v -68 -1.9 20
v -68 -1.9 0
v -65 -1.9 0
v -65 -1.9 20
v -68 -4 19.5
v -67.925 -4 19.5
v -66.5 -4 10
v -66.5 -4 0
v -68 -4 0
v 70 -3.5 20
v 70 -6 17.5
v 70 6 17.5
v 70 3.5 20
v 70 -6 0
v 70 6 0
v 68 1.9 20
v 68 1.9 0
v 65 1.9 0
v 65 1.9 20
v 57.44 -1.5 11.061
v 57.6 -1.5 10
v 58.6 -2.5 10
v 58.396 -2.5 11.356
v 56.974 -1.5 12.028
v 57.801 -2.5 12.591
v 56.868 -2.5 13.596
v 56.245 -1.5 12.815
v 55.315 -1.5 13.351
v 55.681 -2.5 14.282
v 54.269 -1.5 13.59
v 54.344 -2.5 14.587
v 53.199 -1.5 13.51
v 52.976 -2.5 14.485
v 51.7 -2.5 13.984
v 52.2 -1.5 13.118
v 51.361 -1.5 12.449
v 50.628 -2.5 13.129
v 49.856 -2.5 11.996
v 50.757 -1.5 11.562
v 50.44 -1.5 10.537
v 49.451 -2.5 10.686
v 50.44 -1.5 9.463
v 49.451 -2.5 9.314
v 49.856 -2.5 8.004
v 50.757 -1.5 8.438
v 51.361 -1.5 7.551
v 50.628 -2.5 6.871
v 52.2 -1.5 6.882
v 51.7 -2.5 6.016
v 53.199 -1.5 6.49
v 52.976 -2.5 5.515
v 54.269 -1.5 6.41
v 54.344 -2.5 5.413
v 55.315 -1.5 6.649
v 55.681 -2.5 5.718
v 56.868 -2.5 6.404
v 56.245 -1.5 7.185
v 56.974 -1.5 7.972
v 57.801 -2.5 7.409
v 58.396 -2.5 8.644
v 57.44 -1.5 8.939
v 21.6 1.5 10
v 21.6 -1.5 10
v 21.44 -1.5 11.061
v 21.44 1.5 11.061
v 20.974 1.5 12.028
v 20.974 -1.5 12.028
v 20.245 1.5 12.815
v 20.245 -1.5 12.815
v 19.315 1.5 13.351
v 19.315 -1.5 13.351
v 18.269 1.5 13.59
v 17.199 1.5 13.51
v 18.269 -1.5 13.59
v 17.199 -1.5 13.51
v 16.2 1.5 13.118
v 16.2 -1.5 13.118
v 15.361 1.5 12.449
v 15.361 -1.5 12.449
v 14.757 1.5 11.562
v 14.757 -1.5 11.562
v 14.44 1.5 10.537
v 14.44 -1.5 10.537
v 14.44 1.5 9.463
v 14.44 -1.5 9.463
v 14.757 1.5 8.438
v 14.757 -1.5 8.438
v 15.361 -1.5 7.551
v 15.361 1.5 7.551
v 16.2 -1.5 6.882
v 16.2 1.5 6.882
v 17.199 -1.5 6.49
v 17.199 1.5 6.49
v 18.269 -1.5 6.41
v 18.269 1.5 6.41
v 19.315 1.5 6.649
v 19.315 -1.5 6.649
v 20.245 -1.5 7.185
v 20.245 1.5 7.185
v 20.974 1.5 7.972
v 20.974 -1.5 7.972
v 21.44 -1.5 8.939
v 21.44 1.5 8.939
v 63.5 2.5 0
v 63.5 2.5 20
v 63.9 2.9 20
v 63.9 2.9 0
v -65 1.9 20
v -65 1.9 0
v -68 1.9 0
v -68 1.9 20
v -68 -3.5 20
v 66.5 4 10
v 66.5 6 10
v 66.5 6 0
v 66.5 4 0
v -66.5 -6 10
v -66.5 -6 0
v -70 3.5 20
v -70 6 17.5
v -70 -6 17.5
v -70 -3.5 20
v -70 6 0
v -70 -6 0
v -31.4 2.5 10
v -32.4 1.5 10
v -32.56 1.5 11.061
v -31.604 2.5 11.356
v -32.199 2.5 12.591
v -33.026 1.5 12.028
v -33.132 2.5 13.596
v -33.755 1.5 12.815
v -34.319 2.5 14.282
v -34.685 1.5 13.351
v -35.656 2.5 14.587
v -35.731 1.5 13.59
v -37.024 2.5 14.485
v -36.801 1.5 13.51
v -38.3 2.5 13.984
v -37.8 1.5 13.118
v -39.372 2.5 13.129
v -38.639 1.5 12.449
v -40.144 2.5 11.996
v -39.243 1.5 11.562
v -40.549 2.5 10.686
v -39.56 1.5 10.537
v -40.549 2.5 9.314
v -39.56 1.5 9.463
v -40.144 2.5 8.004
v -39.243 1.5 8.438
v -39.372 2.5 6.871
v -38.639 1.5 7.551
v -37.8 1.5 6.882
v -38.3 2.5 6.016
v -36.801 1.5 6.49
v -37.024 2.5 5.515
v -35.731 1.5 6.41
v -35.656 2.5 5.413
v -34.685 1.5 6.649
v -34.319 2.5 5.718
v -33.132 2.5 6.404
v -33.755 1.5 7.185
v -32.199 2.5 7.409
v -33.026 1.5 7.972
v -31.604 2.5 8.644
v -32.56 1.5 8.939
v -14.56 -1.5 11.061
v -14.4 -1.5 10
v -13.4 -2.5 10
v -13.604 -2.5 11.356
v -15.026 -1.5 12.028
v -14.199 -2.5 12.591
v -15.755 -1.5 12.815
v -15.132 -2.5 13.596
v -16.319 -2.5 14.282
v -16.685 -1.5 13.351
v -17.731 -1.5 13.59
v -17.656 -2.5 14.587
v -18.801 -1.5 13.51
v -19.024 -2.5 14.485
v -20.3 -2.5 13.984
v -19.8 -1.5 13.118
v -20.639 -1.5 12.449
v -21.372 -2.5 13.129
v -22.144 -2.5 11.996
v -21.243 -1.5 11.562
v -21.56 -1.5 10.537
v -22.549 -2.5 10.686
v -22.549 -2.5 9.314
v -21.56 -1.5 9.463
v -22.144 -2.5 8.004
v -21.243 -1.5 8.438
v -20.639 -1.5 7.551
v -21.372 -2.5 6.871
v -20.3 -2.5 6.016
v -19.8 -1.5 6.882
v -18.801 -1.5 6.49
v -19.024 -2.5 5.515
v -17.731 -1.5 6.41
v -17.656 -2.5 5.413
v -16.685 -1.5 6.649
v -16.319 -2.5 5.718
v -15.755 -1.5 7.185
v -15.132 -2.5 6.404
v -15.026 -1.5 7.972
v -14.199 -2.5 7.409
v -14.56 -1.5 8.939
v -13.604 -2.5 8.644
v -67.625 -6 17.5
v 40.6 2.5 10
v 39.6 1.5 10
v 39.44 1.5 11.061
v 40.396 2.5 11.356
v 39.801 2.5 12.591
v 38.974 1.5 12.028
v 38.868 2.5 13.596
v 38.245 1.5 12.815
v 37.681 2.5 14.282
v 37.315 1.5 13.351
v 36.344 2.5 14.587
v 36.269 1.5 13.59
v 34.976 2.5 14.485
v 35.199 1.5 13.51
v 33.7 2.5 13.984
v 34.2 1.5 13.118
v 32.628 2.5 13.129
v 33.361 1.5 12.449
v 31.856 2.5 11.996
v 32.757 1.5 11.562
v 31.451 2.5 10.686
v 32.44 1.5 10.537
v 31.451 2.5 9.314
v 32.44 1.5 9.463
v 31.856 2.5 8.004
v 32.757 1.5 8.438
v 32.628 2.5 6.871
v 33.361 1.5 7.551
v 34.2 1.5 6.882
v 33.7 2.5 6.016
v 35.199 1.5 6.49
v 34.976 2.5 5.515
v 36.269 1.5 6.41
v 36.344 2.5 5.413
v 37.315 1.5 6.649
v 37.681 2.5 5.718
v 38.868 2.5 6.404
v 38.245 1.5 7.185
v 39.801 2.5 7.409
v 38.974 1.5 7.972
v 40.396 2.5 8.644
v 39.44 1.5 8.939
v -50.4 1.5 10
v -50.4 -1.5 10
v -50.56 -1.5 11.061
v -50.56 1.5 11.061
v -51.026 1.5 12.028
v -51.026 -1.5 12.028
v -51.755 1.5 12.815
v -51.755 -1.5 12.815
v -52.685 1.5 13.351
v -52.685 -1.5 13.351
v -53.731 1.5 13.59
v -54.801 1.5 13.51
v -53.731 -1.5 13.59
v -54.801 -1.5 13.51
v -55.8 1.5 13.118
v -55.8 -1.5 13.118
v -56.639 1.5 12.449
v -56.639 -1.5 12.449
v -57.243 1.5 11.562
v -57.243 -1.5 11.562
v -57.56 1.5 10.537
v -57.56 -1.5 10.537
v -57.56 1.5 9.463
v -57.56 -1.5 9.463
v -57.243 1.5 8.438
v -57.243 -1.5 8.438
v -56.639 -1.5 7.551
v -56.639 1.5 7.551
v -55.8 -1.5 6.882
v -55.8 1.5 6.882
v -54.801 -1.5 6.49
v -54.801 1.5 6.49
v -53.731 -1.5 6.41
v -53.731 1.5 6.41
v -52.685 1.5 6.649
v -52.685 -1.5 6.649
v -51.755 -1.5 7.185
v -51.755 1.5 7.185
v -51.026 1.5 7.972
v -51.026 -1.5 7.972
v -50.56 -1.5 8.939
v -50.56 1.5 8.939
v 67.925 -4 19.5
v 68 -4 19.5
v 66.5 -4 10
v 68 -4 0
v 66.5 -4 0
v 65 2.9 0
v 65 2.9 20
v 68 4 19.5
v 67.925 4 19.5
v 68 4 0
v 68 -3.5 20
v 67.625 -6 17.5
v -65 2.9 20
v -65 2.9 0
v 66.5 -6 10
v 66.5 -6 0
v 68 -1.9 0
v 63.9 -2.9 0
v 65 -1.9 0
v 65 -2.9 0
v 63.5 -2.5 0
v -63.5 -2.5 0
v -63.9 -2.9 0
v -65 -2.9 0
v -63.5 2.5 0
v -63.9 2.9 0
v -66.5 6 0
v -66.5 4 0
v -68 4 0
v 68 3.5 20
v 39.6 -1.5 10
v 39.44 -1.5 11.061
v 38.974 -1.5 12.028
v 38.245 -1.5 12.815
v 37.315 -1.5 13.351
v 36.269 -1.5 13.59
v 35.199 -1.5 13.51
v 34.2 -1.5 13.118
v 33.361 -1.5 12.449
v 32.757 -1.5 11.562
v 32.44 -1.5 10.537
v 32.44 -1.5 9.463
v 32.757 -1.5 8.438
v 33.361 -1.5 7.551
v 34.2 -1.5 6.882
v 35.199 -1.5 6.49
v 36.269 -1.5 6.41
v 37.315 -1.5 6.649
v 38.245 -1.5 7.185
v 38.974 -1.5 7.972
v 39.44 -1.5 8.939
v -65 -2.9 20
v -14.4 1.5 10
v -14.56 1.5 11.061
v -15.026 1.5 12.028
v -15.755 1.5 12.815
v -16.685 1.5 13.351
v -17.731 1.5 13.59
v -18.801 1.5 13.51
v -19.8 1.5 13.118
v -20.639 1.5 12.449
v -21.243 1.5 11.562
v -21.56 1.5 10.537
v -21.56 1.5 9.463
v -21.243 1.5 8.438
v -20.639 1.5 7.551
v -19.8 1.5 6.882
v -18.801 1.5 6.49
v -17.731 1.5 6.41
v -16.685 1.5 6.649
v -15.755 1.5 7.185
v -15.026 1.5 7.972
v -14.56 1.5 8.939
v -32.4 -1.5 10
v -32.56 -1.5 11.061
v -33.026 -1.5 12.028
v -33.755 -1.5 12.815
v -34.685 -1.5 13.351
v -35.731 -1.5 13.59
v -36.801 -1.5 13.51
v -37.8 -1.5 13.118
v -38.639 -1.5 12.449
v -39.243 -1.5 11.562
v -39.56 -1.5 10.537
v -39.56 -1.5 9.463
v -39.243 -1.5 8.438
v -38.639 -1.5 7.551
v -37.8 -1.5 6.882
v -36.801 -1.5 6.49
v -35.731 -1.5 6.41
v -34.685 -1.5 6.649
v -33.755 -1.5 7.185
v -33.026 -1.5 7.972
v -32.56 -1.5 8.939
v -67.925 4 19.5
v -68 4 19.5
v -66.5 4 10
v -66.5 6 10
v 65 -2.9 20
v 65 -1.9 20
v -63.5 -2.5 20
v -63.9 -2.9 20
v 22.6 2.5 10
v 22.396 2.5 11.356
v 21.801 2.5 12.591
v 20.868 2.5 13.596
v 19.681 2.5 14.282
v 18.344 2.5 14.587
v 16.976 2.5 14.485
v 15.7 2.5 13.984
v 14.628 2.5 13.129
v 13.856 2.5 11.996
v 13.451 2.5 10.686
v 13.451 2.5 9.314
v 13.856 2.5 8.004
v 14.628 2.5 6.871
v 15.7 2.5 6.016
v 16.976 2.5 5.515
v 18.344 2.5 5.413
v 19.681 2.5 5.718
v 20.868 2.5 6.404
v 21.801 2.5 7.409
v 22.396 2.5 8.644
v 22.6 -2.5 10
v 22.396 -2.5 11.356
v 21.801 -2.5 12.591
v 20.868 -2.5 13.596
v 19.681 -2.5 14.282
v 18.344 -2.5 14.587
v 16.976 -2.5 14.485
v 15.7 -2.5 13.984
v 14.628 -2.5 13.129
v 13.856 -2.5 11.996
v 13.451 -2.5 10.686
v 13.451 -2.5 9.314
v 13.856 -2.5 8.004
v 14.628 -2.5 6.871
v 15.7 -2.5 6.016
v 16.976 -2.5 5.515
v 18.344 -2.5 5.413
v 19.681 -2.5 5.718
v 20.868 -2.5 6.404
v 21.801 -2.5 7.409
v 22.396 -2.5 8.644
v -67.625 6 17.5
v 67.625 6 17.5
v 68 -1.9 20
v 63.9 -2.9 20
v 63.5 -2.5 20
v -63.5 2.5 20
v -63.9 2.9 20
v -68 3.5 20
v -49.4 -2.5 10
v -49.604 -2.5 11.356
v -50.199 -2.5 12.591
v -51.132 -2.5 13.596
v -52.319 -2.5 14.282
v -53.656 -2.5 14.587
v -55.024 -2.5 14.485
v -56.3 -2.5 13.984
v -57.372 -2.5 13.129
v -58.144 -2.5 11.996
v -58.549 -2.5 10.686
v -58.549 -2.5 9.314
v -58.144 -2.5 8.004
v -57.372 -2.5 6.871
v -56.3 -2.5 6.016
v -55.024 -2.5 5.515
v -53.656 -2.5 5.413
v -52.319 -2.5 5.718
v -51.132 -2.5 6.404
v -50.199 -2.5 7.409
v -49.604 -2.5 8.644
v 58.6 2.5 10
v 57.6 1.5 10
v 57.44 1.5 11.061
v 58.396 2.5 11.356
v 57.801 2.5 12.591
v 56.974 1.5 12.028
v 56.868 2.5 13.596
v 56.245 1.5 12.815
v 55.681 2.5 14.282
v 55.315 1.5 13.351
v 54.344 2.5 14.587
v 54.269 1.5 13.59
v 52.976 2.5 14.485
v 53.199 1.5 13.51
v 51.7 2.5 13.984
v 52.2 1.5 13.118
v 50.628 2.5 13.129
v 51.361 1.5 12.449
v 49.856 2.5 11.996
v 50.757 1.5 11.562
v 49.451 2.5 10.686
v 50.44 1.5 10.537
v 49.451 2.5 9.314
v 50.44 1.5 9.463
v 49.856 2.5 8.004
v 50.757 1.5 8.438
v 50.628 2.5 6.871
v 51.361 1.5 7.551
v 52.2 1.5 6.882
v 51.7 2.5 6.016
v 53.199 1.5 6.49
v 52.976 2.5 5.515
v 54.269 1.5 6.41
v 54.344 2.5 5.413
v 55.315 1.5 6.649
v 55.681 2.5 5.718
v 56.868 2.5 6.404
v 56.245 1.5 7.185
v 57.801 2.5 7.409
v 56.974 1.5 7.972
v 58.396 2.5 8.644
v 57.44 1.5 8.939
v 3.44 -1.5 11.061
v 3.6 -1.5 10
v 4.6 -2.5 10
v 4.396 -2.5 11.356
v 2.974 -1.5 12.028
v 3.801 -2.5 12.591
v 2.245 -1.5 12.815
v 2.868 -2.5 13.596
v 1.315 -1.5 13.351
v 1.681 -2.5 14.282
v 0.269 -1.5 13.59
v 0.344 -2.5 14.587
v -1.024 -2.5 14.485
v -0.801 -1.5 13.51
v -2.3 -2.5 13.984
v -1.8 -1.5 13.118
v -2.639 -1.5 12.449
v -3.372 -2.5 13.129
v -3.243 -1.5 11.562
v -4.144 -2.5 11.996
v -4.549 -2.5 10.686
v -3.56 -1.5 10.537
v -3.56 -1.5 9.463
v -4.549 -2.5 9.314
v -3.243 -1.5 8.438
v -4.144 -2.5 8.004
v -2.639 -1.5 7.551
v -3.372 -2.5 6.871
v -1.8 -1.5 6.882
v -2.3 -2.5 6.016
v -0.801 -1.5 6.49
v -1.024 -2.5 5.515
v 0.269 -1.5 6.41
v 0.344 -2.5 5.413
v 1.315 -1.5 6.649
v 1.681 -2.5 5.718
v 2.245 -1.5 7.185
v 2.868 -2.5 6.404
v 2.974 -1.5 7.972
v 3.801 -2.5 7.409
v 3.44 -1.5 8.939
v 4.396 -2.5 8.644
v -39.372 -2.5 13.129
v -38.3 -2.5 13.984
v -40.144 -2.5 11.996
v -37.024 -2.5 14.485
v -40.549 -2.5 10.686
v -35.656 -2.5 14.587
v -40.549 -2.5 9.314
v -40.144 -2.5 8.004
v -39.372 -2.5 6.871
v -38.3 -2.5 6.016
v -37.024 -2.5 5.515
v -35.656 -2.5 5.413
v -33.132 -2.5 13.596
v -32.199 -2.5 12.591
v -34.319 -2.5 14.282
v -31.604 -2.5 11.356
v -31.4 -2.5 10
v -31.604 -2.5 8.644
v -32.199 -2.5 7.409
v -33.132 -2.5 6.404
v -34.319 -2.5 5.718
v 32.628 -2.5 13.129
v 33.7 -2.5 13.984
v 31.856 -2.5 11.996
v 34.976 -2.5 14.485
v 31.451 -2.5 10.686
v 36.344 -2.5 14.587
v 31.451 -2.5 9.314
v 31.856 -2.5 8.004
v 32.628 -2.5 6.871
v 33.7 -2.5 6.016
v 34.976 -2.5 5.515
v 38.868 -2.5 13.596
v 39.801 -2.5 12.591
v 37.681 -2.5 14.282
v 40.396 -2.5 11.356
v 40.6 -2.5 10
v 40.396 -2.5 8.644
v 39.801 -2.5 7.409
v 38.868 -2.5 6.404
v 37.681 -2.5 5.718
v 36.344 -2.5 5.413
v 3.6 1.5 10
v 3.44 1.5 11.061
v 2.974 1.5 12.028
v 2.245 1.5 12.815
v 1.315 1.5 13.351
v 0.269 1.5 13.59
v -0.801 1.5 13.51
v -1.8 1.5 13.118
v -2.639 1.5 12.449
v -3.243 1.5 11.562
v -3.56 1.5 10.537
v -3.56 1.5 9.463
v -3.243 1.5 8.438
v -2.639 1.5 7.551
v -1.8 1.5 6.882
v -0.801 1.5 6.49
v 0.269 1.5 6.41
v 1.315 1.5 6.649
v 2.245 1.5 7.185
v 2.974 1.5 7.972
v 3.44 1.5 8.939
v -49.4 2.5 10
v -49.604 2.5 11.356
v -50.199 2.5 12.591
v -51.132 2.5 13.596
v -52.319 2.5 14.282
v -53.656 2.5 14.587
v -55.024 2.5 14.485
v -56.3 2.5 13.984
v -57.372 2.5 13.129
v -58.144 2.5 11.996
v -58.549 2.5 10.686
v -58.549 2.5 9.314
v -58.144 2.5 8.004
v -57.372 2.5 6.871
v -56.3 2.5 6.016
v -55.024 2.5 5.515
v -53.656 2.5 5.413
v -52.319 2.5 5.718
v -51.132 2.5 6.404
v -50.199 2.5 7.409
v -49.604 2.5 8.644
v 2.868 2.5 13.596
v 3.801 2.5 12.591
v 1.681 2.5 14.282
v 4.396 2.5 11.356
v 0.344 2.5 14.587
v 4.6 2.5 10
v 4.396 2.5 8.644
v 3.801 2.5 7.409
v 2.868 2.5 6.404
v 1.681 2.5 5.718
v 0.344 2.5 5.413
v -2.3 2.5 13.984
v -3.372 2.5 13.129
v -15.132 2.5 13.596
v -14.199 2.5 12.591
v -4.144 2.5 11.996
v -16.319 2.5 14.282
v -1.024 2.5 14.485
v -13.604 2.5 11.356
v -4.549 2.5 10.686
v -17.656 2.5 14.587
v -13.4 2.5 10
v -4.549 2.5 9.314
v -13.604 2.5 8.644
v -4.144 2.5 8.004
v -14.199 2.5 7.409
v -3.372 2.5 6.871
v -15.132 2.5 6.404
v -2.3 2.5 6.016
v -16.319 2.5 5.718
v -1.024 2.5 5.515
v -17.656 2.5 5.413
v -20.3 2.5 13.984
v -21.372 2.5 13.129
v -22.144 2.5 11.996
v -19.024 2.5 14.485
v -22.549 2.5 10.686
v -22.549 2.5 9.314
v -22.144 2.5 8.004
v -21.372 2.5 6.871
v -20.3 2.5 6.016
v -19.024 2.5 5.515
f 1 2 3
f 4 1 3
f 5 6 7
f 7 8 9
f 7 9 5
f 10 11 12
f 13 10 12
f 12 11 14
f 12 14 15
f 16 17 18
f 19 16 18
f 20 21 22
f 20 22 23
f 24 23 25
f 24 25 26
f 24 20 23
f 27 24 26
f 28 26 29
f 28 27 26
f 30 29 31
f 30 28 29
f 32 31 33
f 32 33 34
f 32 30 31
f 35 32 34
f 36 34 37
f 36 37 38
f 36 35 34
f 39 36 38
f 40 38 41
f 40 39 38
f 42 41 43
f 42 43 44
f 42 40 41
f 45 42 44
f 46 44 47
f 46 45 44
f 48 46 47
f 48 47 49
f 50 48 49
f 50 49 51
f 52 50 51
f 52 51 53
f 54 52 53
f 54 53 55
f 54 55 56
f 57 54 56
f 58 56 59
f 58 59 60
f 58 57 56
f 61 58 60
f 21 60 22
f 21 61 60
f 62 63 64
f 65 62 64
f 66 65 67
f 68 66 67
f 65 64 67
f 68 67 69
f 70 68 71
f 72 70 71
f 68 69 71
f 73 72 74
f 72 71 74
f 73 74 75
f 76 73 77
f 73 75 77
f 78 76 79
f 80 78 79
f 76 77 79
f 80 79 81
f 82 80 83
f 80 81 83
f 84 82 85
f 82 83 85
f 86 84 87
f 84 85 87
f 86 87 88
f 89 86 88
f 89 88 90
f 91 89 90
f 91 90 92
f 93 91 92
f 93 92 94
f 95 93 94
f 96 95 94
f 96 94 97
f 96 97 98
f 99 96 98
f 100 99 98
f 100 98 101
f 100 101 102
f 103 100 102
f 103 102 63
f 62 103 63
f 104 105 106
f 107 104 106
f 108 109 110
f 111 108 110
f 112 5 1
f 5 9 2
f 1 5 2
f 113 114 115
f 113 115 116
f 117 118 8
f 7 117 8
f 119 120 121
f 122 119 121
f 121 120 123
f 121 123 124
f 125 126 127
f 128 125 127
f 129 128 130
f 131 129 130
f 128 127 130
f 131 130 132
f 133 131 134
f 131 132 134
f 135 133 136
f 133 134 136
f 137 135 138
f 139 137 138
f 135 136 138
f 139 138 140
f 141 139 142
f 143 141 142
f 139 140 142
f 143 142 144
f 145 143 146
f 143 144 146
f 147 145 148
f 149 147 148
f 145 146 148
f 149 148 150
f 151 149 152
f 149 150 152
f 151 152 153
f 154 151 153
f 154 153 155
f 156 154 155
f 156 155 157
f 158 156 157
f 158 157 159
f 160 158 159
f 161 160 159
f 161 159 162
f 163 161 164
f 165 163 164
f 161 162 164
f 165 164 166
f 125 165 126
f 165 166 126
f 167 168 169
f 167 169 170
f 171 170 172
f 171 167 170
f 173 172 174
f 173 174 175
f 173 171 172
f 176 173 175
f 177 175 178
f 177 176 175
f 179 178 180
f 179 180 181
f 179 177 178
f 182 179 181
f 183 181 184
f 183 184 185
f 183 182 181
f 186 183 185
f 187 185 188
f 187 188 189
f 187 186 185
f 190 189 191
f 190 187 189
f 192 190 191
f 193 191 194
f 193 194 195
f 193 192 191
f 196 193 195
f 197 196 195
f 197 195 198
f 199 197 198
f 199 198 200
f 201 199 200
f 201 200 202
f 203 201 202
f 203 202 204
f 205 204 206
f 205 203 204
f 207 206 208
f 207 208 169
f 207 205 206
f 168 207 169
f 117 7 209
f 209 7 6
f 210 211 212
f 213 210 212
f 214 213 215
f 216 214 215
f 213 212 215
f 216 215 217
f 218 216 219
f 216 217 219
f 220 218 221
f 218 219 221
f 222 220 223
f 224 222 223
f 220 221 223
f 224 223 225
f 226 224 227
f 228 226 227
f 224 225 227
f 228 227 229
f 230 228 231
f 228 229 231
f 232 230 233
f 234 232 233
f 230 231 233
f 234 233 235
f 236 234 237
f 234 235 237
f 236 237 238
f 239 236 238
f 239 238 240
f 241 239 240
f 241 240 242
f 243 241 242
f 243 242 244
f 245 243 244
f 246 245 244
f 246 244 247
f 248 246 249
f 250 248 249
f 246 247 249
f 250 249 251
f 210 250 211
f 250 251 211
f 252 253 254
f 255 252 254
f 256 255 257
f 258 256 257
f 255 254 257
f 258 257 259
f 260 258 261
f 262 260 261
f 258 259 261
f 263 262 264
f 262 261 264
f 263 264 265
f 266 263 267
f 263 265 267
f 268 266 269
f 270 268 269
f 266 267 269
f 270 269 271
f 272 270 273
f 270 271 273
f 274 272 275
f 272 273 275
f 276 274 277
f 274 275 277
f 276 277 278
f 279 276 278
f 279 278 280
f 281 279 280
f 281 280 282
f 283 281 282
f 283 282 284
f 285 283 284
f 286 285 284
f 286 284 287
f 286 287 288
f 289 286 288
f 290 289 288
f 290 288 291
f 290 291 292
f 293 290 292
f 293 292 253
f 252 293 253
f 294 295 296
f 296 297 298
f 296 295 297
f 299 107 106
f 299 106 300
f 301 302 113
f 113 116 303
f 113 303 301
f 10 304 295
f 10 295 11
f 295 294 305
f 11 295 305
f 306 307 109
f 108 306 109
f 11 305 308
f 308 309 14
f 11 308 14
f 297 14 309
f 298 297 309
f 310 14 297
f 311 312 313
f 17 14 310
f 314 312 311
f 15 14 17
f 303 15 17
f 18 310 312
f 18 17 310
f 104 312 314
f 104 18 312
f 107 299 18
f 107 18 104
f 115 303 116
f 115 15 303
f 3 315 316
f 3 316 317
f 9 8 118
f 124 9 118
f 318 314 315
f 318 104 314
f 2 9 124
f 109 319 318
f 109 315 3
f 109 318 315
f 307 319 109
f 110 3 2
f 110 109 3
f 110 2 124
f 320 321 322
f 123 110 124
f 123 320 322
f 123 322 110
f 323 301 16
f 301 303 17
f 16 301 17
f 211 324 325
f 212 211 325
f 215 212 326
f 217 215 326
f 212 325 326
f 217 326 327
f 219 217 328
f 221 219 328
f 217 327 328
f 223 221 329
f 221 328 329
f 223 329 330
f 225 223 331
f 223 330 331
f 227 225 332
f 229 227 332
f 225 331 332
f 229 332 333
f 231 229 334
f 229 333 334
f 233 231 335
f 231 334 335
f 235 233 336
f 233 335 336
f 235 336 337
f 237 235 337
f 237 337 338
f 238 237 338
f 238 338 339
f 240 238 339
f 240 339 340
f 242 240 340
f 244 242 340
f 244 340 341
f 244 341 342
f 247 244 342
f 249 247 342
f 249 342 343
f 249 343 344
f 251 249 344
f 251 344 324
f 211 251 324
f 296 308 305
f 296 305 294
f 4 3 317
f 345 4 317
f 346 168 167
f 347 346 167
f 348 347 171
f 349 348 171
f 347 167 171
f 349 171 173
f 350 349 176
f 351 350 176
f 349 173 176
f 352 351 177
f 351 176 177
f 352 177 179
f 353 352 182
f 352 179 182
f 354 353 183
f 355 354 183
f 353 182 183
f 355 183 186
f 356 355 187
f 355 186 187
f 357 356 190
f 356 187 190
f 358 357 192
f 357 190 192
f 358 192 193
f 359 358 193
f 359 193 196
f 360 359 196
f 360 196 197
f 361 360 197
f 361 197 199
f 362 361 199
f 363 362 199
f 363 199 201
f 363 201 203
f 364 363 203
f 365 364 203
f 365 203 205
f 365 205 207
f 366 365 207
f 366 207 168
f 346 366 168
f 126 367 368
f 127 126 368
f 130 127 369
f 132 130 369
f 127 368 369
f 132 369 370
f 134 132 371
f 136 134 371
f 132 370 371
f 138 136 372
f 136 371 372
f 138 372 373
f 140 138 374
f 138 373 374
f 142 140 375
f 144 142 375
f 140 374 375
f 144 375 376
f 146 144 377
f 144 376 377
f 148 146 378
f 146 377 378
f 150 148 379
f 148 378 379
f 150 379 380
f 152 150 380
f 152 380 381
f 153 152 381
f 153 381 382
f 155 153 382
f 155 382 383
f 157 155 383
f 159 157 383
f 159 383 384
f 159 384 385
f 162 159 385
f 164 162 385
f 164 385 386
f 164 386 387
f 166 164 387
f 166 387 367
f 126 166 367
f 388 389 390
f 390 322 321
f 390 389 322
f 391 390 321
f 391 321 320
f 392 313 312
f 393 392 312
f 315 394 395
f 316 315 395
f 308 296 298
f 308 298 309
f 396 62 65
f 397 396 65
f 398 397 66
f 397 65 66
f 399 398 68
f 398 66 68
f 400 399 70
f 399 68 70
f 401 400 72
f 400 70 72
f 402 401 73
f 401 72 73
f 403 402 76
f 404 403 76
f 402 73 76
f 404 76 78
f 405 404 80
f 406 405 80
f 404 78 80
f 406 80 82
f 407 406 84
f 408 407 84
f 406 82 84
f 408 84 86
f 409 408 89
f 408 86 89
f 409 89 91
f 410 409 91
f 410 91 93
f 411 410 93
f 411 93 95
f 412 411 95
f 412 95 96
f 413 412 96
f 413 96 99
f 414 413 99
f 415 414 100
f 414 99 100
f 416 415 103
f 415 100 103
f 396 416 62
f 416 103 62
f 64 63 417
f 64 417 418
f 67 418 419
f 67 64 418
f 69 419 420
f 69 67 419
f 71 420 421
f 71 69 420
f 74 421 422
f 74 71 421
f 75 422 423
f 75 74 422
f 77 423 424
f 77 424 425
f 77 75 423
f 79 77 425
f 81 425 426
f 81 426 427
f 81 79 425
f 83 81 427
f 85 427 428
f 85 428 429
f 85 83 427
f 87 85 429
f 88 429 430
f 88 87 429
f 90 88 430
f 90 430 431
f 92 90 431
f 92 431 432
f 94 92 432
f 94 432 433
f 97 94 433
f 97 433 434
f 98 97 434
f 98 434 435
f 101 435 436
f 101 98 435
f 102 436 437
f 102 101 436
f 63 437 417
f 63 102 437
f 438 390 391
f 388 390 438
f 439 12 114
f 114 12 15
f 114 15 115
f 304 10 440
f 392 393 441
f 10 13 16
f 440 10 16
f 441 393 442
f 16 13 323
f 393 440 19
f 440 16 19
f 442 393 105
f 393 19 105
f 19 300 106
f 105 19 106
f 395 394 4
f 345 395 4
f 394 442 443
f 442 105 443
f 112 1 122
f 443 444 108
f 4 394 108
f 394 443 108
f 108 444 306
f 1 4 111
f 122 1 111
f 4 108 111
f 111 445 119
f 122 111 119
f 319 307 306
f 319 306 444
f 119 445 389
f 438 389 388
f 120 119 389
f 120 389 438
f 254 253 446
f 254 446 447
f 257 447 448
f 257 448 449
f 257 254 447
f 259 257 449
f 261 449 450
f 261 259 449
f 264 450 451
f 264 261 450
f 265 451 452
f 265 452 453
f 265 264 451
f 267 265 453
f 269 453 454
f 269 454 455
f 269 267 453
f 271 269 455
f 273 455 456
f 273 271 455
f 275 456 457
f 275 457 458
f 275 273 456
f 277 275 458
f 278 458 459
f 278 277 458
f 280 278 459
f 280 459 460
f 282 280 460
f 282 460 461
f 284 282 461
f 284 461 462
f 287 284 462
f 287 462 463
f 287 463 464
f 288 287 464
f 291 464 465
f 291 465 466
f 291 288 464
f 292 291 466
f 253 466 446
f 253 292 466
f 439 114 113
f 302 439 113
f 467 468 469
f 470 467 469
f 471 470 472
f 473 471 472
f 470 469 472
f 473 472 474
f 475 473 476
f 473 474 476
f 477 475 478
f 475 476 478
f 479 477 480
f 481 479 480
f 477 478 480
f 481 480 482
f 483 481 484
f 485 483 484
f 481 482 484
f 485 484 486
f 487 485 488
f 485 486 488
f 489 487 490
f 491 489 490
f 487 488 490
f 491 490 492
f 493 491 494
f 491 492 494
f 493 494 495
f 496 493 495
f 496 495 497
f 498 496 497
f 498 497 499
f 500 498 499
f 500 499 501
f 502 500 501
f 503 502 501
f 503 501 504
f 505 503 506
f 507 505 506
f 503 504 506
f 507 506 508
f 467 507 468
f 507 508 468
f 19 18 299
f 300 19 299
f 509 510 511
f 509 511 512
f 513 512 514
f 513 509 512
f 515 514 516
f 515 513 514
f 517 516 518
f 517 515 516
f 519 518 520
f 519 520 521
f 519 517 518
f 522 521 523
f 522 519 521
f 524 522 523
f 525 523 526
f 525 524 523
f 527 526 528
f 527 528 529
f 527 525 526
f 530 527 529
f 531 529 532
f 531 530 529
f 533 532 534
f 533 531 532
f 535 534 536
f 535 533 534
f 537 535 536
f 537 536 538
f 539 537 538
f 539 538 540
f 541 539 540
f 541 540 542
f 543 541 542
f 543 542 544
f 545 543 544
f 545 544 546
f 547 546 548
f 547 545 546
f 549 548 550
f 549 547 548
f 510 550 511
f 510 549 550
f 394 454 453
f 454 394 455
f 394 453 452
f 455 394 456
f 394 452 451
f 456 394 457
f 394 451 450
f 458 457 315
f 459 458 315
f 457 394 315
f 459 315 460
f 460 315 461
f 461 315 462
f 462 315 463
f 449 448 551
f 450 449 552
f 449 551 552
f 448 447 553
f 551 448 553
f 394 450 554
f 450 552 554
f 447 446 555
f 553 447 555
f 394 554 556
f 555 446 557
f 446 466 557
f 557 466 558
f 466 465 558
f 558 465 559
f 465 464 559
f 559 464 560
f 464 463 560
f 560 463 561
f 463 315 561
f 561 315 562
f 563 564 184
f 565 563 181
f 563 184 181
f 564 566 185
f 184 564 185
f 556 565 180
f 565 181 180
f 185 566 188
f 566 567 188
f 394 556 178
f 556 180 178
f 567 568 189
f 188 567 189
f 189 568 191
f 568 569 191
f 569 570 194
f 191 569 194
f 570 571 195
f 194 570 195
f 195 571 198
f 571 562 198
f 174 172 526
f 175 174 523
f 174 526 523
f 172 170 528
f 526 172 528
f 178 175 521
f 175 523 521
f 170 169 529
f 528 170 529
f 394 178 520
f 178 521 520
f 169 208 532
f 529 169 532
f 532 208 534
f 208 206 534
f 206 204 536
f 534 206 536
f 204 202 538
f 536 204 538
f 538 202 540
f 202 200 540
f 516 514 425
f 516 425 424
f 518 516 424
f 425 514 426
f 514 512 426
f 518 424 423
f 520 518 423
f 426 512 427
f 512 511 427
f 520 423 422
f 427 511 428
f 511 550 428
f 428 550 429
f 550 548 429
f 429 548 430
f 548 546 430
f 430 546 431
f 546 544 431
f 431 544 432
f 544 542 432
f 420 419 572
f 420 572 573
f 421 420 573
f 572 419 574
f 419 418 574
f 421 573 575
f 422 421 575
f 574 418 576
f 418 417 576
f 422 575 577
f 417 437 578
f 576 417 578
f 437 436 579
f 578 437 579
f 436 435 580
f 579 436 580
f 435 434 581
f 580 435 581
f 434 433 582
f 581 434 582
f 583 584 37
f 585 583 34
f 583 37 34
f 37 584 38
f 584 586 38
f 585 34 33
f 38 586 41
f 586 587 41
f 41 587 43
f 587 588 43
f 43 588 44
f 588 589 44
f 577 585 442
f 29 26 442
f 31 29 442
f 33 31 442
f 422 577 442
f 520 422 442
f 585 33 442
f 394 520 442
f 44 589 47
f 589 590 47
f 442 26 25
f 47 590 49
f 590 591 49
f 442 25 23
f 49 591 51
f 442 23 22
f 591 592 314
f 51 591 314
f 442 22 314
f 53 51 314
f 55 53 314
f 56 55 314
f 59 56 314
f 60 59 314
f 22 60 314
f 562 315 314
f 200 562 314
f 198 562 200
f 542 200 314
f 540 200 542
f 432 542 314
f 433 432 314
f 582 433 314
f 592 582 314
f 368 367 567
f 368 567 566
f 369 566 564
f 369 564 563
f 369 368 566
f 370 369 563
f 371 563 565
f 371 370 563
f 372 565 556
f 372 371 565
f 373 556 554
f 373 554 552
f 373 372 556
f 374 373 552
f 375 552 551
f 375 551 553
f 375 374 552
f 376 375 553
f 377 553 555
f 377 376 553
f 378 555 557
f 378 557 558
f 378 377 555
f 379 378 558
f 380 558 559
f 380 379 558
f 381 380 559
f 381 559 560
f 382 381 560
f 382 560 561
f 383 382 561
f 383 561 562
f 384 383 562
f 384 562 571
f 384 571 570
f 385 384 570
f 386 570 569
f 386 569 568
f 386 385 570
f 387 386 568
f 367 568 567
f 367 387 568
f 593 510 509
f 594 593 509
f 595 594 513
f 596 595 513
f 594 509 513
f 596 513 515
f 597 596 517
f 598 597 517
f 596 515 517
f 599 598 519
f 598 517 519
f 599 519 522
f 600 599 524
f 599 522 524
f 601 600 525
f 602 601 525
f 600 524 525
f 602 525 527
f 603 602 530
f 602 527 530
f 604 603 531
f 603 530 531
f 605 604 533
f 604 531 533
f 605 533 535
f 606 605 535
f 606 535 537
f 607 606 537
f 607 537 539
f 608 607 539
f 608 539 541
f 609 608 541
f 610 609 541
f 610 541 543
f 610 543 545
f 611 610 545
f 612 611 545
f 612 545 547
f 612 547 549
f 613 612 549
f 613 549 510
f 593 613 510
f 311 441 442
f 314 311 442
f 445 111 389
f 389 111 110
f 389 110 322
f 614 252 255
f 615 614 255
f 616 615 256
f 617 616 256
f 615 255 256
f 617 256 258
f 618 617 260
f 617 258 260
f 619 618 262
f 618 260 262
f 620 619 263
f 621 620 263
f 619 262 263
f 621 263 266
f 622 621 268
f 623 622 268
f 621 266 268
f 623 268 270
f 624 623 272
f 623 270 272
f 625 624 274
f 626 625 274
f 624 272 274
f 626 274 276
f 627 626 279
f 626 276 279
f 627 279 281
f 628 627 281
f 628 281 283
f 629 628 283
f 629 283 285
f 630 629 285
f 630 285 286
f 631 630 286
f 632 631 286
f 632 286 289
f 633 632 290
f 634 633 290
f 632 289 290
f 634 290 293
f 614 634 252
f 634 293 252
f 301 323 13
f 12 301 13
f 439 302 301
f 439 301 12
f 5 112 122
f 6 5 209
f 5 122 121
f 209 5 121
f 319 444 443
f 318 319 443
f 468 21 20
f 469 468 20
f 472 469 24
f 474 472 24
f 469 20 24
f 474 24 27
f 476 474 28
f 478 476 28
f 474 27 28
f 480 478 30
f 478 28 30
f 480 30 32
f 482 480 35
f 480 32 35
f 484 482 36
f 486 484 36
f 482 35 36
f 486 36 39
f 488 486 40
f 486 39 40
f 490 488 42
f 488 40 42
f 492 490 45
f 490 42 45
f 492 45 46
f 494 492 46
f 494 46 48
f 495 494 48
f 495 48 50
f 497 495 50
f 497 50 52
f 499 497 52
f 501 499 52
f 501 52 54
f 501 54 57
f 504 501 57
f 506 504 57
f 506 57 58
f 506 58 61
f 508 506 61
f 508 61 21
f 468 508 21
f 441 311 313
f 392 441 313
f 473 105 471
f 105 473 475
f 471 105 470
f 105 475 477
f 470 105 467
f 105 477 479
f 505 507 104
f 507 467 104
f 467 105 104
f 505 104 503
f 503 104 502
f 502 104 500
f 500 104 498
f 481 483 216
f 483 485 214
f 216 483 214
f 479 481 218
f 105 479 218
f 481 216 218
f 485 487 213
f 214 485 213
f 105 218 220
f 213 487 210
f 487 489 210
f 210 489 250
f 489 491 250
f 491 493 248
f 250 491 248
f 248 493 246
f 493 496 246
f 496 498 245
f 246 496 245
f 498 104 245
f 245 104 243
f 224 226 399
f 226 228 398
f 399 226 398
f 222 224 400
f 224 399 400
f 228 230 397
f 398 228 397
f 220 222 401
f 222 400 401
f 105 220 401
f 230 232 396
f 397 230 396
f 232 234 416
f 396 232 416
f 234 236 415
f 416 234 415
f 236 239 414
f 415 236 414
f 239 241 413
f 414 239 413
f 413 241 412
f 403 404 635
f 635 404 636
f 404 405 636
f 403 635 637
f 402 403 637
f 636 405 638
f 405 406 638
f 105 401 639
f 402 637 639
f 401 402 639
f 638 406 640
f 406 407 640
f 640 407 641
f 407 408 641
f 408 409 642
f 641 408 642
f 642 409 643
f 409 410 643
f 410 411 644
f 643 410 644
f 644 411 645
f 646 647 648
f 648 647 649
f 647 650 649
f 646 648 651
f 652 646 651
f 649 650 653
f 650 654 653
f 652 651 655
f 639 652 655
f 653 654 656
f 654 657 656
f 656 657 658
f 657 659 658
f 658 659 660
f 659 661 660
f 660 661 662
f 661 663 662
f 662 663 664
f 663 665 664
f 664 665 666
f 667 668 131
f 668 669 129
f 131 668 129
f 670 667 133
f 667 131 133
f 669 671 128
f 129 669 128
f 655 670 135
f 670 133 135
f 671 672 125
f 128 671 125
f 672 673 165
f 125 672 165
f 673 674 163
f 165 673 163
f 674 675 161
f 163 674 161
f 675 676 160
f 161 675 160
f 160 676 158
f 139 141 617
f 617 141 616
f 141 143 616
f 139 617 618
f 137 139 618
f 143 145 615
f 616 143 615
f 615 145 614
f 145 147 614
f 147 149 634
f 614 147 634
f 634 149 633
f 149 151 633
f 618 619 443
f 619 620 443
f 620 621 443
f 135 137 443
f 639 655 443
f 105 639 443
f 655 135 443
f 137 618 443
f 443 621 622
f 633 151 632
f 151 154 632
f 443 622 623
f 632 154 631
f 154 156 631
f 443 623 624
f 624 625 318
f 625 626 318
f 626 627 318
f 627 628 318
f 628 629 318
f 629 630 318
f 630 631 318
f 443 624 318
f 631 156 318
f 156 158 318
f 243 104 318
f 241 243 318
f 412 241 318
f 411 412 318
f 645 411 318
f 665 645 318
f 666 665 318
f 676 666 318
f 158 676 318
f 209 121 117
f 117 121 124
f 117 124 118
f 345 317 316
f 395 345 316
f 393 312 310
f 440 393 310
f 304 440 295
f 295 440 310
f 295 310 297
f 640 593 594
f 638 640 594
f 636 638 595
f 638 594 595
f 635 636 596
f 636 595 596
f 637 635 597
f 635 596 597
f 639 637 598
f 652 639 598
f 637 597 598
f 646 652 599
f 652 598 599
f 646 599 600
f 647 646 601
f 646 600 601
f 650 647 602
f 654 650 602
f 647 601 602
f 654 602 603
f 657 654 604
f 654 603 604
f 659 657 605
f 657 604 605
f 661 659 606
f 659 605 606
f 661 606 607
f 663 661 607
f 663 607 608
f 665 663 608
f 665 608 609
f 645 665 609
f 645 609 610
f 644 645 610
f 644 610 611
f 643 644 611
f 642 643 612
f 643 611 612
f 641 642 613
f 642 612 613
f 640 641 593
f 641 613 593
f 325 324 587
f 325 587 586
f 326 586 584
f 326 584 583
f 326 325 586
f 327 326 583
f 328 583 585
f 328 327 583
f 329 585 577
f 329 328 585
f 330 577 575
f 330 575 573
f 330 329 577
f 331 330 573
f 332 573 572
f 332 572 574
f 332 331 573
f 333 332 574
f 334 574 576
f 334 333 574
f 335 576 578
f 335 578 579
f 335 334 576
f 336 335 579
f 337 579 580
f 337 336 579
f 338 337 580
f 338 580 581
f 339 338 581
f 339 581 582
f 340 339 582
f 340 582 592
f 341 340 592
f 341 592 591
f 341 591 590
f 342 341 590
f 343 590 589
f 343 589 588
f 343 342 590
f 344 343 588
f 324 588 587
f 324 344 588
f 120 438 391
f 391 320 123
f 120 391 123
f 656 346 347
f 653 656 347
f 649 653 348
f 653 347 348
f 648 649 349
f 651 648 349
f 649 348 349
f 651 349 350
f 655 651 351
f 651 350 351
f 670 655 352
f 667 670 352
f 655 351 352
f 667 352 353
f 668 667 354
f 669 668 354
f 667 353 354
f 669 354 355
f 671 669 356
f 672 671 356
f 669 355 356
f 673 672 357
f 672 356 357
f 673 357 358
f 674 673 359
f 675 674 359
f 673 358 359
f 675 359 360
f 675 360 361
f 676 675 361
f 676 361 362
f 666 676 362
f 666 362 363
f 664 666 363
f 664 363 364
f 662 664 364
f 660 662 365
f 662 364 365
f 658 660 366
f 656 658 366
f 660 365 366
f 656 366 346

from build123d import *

# Parameters (mm, degrees)
F1_DEPTH     = 20
F2_T4_DEPTH  = 20
F2_T9_DEPTH  = 20
F2_T14_DEPTH = 20
F2_T19_DEPTH = 20
F3_SIZE2     = 1.5
F3_SIZE      = 10
F3_2_SIZE2   = 1.5
F3_2_SIZE    = 10
F3_3_SIZE2   = 1.5
F3_3_SIZE    = 10
F3_4_SIZE2   = 1.5
F3_4_SIZE    = 10
F4_T1_DEPTH  = 14.8584149398
F4_T3_DEPTH  = 14.8584149398
F5_R         = 3.6
F6_DEPTH     = 25
F7_SIZE      = 1


# Not quite as in the source:
# - a fillet or chamfer that OpenCascade refuses, or shapes differently, is made with other operations: its cross-section is extruded or revolved along the edge and cut away or added


with BuildPart() as f1:
    # F0 (on Top) → F1 (new body)
    with BuildSketch(Plane.XY):
        Polygon((-70, 6), (-70, 0), (-70, -6), (-66.5, -6), (-66.5, -4), (-68, -4), (-68, -1.9), (-65, -1.9), (-65, -2.9), (-64, -2.9), (-64, -2.5), (0, -2.5), (64, -2.5), (64, -2.9), (65, -2.9), (65, -1.9), (68, -1.9), (68, -4), (66.5, -4), (66.5, -6), (70, -6), (70, 0), (70, 6), (66.5, 6), (66.5, 4), (68, 4), (68, 1.9), (65, 1.9), (65, 2.9), (64, 2.9), (64, 2.5), (0, 2.5), (-64, 2.5), (-64, 2.9), (-65, 2.9), (-65, 1.9), (-68, 1.9), (-68, 4), (-66.5, 4), (-66.5, 6), align=None)
    extrude(amount=F1_DEPTH)

    # F2: chamfer of 0.5 on 4 edges, made by hand


with BuildPart() as f2_tool2:
    # F2_s3 → F2_t4 (new body)
    with BuildSketch(Plane.XY):
        Polygon((-64, 3), (-63.5, 2.5), (-64, 2.5), align=None)
    extrude(amount=F2_T4_DEPTH)

    split(bisect_by=Plane.XZ.offset(-2.9), keep=Keep.TOP)


with BuildPart() as f1_1:
    add(f1.part)

    # F2_t1: union F2_tool2
    add(f2_tool2.part)


with BuildPart() as f2_tool7:
    # F2_s8 → F2_t9 (new body)
    with BuildSketch(Plane.XY):
        Polygon((-63.5, -2.5), (-64, -3), (-64, -2.5), align=None)
    extrude(amount=F2_T9_DEPTH)

    split(bisect_by=Plane.XZ.offset(2.9), keep=Keep.BOTTOM)


with BuildPart() as f1_2:
    add(f1_1.part)

    # F2_t6: union F2_tool7
    add(f2_tool7.part)


with BuildPart() as f2_tool12:
    # F2_s13 → F2_t14 (new body)
    with BuildSketch(Plane.XY):
        Polygon((64, -3), (63.5, -2.5), (64, -2.5), align=None)
    extrude(amount=F2_T14_DEPTH)

    split(bisect_by=Plane.XZ.offset(2.9), keep=Keep.BOTTOM)


with BuildPart() as f1_3:
    add(f1_2.part)

    # F2_t11: union F2_tool12
    add(f2_tool12.part)


with BuildPart() as f2_tool17:
    # F2_s18 → F2_t19 (new body)
    with BuildSketch(Plane.XY):
        Polygon((63.5, 2.5), (64, 3), (64, 2.5), align=None)
    extrude(amount=F2_T19_DEPTH)

    split(bisect_by=Plane.XZ.offset(-2.9), keep=Keep.TOP)


with BuildPart() as f1_4:
    add(f1_3.part)

    # F2_t16: union F2_tool17
    add(f2_tool17.part)

    # F3
    f3_edges = [f1_4.edges().sort_by_distance(p)[0] for p in [
        (-66.5, 5, 20),
    ]]
    f3_side = f1_4.faces().sort_by_distance((-66.5, 5, 10))[0]
    chamfer(f3_edges, length=F3_SIZE, length2=F3_SIZE2, reference=f3_side)

    # F3#2
    f3_2_edges = [f1_4.edges().sort_by_distance(p)[0] for p in [
        (-66.5, -5, 20),
    ]]
    f3_2_side = f1_4.faces().sort_by_distance((-66.5, -5, 10))[0]
    chamfer(f3_2_edges, length=F3_2_SIZE, length2=F3_2_SIZE2, reference=f3_2_side)

    # F3#3
    f3_3_edges = [f1_4.edges().sort_by_distance(p)[0] for p in [
        (66.5, 5, 20),
    ]]
    f3_3_side = f1_4.faces().sort_by_distance((66.5, 5, 10))[0]
    chamfer(f3_3_edges, length=F3_3_SIZE, length2=F3_3_SIZE2, reference=f3_3_side)

    # F3#4
    f3_4_edges = [f1_4.edges().sort_by_distance(p)[0] for p in [
        (66.5, -5, 20),
    ]]
    f3_4_side = f1_4.faces().sort_by_distance((66.5, -5, 10))[0]
    chamfer(f3_4_edges, length=F3_4_SIZE, length2=F3_4_SIZE2, reference=f3_4_side)

    # F4: chamfer of 2.5 on 4 edges, made by hand

    # F4_s2 → F4_t1 (cut)
    with BuildSketch(Plane.YZ.offset(-76.4292074699)):
        Polygon((3.5, 20), (6, 17.5), (6, 20), align=None)
        Polygon((-3.5, 20), (-6, 17.5), (-6, 20), align=None)
    extrude(amount=F4_T1_DEPTH, mode=Mode.SUBTRACT)

    # F4_s4 → F4_t3 (cut)
    with BuildSketch(Plane.YZ.offset(61.5707925301)):
        Polygon((3.5, 20), (6, 17.5), (6, 20), align=None)
        Polygon((-3.5, 20), (-6, 17.5), (-6, 20), align=None)
    extrude(amount=F4_T3_DEPTH, mode=Mode.SUBTRACT)

    # F5 (on face) → F6 (cut)
    with BuildSketch(Plane.XZ.offset(2.5)):
        with Locations((-54, 10)):
            Circle(F5_R)
        with Locations((-36, 10)):
            Circle(F5_R)
        with Locations((-18, 10)):
            Circle(F5_R)
        with Locations((0, 10)):
            Circle(F5_R)
        with Locations((18, 10)):
            Circle(F5_R)
        with Locations((36, 10)):
            Circle(F5_R)
        with Locations((54, 10)):
            Circle(F5_R)
    extrude(amount=-F6_DEPTH, mode=Mode.SUBTRACT)

    # F7
    f7_edges = [f1_4.edges().sort_by_distance(p)[0] for p in [
        (-57.6, -2.5, 10),
        (-50.4, 0, 10),
        (-57.6, 2.5, 10),
        (-39.6, -2.5, 10),
        (-32.4, 0, 10),
        (-39.6, 2.5, 10),
        (-21.6, -2.5, 10),
        (-14.4, 0, 10),
        (-21.6, 2.5, 10),
        (-3.6, -2.5, 10),
        (3.6, 0, 10),
        (-3.6, 2.5, 10),
        (14.4, -2.5, 10),
        (21.6, 0, 10),
        (14.4, 2.5, 10),
        (32.4, -2.5, 10),
        (39.6, 0, 10),
        (32.4, 2.5, 10),
        (50.4, -2.5, 10),
        (57.6, 0, 10),
        (50.4, 2.5, 10),
    ]]
    chamfer(f7_edges, length=F7_SIZE)


solid = f1_4.part
